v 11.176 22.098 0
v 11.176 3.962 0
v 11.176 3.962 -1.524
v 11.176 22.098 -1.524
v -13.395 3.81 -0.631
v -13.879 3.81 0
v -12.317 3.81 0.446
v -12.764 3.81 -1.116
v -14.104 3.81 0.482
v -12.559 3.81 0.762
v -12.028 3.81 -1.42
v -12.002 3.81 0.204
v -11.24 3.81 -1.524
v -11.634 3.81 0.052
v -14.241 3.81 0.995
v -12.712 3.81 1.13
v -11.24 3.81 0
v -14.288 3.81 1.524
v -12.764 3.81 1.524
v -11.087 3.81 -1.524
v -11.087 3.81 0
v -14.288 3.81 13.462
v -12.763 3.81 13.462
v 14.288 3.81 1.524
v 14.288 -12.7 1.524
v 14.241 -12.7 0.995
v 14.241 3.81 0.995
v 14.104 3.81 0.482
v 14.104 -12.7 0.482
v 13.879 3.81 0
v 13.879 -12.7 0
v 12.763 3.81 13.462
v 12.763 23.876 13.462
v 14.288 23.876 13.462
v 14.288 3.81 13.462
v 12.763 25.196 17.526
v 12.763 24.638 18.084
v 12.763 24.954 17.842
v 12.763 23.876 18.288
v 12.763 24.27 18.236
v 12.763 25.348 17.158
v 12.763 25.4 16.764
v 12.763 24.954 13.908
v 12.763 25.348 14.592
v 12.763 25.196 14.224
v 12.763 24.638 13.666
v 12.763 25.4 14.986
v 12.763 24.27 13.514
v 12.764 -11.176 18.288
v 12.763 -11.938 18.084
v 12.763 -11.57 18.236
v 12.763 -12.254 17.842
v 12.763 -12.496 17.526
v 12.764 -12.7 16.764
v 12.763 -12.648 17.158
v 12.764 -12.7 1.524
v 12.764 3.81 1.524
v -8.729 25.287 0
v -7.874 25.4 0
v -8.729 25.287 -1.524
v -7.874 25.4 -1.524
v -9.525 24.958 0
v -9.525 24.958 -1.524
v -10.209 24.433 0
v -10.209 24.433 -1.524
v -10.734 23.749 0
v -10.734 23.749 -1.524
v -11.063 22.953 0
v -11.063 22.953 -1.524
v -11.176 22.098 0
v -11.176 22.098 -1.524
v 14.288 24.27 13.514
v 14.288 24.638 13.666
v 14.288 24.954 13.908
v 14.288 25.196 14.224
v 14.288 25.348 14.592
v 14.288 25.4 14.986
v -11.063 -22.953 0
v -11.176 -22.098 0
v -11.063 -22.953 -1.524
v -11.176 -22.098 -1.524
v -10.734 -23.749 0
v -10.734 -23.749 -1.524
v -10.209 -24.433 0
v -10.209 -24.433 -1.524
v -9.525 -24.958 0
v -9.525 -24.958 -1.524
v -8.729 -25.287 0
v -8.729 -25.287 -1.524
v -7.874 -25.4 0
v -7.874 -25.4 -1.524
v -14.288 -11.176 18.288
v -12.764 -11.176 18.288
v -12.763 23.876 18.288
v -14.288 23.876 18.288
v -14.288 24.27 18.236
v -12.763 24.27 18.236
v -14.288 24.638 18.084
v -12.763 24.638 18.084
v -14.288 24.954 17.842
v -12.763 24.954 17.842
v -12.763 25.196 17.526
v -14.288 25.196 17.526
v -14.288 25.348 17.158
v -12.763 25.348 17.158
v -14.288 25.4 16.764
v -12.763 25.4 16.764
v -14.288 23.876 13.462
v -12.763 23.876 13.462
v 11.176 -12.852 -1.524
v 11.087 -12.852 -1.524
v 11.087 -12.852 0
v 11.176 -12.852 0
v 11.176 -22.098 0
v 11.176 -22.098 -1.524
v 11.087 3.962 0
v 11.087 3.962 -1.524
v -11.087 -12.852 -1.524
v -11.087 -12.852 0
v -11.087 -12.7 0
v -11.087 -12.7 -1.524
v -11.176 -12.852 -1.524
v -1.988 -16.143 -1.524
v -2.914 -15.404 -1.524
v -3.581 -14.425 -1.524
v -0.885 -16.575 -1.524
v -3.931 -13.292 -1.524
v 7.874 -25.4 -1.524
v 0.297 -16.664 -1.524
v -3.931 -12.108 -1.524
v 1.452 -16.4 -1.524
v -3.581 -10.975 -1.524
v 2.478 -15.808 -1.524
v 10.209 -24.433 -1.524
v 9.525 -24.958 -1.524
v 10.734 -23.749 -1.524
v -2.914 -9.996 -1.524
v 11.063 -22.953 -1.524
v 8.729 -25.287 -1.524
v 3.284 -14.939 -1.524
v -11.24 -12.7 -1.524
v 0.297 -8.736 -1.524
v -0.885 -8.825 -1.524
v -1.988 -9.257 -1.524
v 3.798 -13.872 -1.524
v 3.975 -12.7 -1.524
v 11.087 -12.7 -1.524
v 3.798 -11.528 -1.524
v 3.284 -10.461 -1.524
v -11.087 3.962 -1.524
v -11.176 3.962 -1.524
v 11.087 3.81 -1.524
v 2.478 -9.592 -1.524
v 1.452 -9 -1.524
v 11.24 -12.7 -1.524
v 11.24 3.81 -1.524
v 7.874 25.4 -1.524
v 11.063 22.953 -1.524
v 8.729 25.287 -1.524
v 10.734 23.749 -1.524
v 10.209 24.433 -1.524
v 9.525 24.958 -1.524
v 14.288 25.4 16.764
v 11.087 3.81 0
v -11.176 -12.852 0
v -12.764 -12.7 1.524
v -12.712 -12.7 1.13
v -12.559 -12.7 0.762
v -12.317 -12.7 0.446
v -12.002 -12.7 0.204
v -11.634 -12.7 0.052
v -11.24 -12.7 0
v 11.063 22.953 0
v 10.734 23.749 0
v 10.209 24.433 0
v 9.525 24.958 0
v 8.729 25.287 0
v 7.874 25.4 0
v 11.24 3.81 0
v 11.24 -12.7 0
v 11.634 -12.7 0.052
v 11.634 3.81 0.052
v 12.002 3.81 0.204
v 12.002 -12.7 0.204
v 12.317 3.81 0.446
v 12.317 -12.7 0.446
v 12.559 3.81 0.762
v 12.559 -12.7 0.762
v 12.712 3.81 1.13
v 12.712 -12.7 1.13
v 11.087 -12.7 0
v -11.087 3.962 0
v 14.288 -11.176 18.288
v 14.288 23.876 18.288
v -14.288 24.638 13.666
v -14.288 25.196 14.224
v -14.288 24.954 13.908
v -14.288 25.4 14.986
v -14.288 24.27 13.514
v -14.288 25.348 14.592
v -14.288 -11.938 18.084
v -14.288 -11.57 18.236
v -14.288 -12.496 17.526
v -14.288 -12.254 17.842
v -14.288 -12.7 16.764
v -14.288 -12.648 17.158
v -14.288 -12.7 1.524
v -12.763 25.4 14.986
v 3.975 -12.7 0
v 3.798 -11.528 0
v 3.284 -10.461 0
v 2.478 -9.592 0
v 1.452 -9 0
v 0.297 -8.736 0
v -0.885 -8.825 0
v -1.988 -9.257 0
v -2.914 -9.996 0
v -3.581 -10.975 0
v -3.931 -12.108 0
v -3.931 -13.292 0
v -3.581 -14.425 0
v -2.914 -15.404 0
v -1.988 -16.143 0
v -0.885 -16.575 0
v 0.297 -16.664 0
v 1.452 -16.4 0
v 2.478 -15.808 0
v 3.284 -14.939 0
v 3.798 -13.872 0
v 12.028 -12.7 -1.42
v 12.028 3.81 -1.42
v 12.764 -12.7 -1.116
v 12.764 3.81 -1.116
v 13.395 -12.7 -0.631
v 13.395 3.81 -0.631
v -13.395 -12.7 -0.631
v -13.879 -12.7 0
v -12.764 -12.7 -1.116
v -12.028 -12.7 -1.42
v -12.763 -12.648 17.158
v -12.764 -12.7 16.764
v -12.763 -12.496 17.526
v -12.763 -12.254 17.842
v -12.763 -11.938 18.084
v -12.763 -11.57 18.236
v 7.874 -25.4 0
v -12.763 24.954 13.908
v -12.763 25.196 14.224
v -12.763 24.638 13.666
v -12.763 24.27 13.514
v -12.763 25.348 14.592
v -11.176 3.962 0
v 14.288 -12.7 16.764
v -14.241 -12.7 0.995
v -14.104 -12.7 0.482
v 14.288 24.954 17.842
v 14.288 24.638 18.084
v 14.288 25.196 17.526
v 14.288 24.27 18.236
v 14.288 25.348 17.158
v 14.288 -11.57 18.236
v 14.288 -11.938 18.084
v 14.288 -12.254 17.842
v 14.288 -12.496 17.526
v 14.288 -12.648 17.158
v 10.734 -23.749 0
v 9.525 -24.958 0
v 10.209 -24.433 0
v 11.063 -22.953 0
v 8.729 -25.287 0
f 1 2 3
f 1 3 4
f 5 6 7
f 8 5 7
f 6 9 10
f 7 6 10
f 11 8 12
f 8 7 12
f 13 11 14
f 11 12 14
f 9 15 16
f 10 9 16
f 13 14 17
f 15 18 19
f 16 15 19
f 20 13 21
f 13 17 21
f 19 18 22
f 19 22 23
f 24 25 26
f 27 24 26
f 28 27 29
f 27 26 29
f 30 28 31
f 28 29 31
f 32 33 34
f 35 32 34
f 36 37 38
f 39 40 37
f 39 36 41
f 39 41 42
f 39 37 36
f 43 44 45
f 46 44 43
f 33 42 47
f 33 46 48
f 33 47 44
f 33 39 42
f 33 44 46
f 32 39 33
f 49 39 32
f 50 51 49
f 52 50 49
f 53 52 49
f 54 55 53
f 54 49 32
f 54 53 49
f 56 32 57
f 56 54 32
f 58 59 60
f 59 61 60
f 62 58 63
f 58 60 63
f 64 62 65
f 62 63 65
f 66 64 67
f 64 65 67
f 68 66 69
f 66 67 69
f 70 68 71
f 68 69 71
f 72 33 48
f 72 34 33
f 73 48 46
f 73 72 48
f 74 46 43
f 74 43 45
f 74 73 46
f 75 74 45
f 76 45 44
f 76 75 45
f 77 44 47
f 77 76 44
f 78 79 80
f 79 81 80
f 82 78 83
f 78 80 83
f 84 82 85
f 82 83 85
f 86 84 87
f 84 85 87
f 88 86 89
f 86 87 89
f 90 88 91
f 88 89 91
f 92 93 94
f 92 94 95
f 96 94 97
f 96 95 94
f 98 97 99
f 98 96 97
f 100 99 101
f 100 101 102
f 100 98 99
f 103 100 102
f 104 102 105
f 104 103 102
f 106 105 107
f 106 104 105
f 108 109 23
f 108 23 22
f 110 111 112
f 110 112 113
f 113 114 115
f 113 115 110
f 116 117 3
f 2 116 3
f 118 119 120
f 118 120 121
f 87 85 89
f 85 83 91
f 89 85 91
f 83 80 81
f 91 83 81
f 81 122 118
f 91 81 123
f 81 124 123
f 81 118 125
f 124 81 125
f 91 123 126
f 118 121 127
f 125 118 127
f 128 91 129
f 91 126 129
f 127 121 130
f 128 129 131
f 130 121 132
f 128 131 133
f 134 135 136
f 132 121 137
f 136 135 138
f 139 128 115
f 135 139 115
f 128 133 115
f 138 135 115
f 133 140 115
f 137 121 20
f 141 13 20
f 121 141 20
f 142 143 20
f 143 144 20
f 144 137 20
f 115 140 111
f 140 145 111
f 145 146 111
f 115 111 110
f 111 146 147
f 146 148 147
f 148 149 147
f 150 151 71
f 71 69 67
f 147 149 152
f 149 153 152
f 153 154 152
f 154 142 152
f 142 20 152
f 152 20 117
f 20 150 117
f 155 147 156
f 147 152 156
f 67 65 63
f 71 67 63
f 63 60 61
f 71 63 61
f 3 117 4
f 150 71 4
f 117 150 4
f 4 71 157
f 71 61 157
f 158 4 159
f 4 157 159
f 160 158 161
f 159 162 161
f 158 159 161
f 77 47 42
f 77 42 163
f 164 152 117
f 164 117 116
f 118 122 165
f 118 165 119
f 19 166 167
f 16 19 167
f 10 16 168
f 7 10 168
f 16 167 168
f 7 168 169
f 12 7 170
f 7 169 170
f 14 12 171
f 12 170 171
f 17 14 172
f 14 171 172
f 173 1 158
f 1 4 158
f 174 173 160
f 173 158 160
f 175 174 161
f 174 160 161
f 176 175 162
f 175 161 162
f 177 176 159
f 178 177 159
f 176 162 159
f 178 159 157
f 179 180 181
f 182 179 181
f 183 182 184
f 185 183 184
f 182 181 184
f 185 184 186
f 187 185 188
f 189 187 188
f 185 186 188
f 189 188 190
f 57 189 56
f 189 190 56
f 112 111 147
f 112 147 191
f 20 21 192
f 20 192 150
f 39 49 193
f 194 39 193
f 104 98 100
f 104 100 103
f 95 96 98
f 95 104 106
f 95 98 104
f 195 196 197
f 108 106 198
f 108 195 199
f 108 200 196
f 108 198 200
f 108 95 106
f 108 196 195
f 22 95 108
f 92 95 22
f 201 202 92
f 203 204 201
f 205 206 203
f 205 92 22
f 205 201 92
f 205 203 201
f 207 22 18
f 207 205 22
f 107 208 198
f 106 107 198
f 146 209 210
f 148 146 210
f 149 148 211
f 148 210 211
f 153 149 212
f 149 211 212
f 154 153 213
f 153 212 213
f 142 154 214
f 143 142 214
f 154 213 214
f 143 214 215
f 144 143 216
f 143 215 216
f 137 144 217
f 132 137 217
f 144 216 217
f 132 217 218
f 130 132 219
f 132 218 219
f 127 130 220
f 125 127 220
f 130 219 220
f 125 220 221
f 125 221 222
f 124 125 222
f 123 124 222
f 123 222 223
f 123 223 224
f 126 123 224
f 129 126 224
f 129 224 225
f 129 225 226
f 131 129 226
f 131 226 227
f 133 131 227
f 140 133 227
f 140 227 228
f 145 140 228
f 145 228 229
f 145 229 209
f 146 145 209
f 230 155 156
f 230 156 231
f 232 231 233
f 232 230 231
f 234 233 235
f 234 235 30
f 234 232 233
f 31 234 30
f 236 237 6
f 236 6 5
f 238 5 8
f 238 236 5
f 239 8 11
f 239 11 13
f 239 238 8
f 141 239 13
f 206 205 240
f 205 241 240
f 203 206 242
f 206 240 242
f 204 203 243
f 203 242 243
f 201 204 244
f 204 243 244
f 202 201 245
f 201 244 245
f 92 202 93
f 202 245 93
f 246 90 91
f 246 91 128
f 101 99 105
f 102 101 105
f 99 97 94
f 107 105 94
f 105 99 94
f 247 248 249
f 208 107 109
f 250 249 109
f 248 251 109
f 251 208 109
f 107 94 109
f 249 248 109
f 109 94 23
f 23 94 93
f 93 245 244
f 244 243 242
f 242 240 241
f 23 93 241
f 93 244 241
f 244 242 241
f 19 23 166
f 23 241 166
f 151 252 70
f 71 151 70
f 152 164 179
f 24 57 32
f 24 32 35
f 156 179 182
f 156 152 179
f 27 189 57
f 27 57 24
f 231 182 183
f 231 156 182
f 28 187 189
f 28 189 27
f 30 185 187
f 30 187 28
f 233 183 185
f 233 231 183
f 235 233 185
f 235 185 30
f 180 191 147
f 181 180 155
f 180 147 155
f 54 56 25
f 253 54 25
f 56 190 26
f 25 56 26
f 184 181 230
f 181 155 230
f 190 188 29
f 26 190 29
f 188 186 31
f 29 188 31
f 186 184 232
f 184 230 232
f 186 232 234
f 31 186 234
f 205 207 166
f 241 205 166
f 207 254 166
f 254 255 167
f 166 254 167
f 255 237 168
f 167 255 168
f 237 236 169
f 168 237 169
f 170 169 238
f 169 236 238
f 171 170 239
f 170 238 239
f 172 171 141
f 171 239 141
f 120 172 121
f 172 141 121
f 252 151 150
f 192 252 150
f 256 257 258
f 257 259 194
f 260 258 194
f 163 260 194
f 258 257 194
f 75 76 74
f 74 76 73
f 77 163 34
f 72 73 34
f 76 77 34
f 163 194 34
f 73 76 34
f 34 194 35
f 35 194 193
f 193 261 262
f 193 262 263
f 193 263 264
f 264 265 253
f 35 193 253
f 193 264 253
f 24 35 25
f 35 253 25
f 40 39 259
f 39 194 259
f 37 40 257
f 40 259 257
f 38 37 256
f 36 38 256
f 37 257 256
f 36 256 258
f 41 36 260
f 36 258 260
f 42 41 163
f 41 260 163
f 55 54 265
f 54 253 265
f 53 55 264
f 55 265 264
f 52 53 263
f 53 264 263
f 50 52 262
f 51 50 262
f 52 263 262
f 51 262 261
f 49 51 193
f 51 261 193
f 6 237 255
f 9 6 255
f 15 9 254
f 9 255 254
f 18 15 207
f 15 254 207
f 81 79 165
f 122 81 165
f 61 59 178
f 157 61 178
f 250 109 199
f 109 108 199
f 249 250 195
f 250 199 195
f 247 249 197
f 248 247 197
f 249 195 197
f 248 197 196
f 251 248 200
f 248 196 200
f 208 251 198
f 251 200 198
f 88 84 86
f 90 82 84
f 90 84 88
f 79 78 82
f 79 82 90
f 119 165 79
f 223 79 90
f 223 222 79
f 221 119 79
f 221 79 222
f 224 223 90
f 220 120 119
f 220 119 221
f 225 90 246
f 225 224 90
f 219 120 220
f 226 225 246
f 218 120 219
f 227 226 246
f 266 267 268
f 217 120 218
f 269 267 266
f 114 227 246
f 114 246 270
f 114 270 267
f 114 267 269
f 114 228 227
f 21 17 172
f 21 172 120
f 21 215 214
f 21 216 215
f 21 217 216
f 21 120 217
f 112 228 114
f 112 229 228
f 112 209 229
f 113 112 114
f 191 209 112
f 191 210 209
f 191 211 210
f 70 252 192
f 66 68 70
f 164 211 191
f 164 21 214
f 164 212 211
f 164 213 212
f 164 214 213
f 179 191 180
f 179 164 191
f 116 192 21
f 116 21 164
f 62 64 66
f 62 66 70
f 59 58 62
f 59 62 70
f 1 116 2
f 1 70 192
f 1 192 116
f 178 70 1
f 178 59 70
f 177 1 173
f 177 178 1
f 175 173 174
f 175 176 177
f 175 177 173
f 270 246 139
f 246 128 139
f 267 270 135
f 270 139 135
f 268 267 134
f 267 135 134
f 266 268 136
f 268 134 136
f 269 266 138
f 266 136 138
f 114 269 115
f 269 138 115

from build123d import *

# Parameters (mm, degrees)
CROQUIS1_W               = 28.575
CROQUIS1_H               = 50.8
BRIDA_BASE1_DEPTH        = 1.524
CROQUIS6_R               = 3.9751
CROQUIS6_W               = 3.1115
CROQUIS6_H               = 21.59
CROQUIS6_H_2             = 12.7
CORTAR_EXTRUIR1_DEPTH    = 30.182447331
BRIDA_START              = -12.7
BRIDA_DE_ARISTA1_DEPTH   = 16.51
BRIDA_START_2            = -12.8524
BRIDA_DE_ARISTA1_2_DEPTH = 0.1524
BRIDA_START_3            = 3.81
BRIDA_DE_ARISTA1_3_DEPTH = 0.1524
BRIDA_DE_ARISTA1_4_DEPTH = 16.51
CROQUIS13_W              = 1.524
CROQUIS13_H              = 4.826
SALIENTE_EXTRUIR1_DEPTH  = 21.59
REDONDEO1_R              = 3.302
REDONDEO2_R              = 1.524


# Read off the part's stored shape, not the designer's step: Brida de arista1
# Sheet-metal steps are written as plain solids
with BuildPart() as part:
    # Croquis1 → Brida base1 (new body)
    with BuildSketch(Plane.XY):
        Rectangle(CROQUIS1_W, CROQUIS1_H)
    extrude(amount=-BRIDA_BASE1_DEPTH)

    # Croquis6 → Cortar-Extruir1 (cut, through all)
    with BuildSketch(Plane.XY):
        with Locations((0, -12.7)):
            Circle(CROQUIS6_R)
        with Locations((-12.73175, 14.605)):
            Rectangle(CROQUIS6_W, CROQUIS6_H)
        with Locations((12.73175, 14.605)):
            Rectangle(CROQUIS6_W, CROQUIS6_H)
        with Locations((-12.73175, -19.05)):
            Rectangle(CROQUIS6_W, CROQUIS6_H_2)
        with Locations((12.73175, -19.05)):
            Rectangle(CROQUIS6_W, CROQUIS6_H_2)
    extrude(amount=-CORTAR_EXTRUIR1_DEPTH, mode=Mode.SUBTRACT)

    # Brida de arista1 outline → Brida de arista1 (cut)
    with BuildSketch(Plane(origin=(0, 0, 0), x_dir=(1, 0, 0), z_dir=(0, 1, 0)).offset(BRIDA_START)):
        with BuildLine():
            Line((14.2875, 1.524), (11.2395, 1.524))
            ThreePointArc((11.2395, 1.524), (12.7635, 1.115645431), (13.879145431, 0))
            Line((13.879145431, 0), (14.2875, 0))
            Line((14.2875, 0), (14.2875, 1.524))
        make_face()
        with BuildLine():
            ThreePointArc((-13.879145431, 0), (-12.7635, 1.115645431), (-11.2395, 1.524))
            Line((-11.2395, 1.524), (-14.2875, 1.524))
            Line((-14.2875, 1.524), (-14.2875, 0))
            Line((-14.2875, 0), (-13.879145431, 0))
        make_face()
    extrude(amount=BRIDA_DE_ARISTA1_DEPTH, mode=Mode.SUBTRACT)

    # Brida de arista1 2 outline → Brida de arista1 2 (cut)
    with BuildSketch(Plane(origin=(0, 0, 0), x_dir=(1, 0, 0), z_dir=(0, 1, 0)).offset(BRIDA_START_2)):
        with BuildLine():
            Line((11.0871, 1.524), (11.0871, 0))
            Line((11.0871, 0), (13.879145431, 0))
            ThreePointArc((13.879145431, 0), (12.7635, 1.115645431), (11.2395, 1.524))
            Line((11.2395, 1.524), (11.0871, 1.524))
        make_face()
        with BuildLine():
            Line((-13.879145431, 0), (-11.0871, 0))
            Line((-11.0871, 0), (-11.0871, 1.524))
            Line((-11.0871, 1.524), (-11.2395, 1.524))
            ThreePointArc((-11.2395, 1.524), (-12.7635, 1.115645431), (-13.879145431, 0))
        make_face()
    extrude(amount=BRIDA_DE_ARISTA1_2_DEPTH, mode=Mode.SUBTRACT)

    # Brida de arista1 3 outline → Brida de arista1 3 (cut)
    with BuildSketch(Plane(origin=(0, 0, 0), x_dir=(1, 0, 0), z_dir=(0, 1, 0)).offset(BRIDA_START_3)):
        with BuildLine():
            Line((11.0871, 1.524), (11.0871, 0))
            Line((11.0871, 0), (13.879145431, 0))
            ThreePointArc((13.879145431, 0), (12.7635, 1.115645431), (11.2395, 1.524))
            Line((11.2395, 1.524), (11.0871, 1.524))
        make_face()
        with BuildLine():
            Line((-13.879145431, 0), (-11.0871, 0))
            Line((-11.0871, 0), (-11.0871, 1.524))
            Line((-11.0871, 1.524), (-11.2395, 1.524))
            ThreePointArc((-11.2395, 1.524), (-12.7635, 1.115645431), (-13.879145431, 0))
        make_face()
    extrude(amount=BRIDA_DE_ARISTA1_3_DEPTH, mode=Mode.SUBTRACT)

    # Brida de arista1 4 outline → Brida de arista1 4 (add)
    with BuildSketch(Plane(origin=(0, 0, 0), x_dir=(1, 0, 0), z_dir=(0, 1, 0)).offset(BRIDA_START)):
        with BuildLine():
            Line((13.879145431, 0), (11.2395, 0))
            ThreePointArc((11.2395, 0), (12.317130735, -0.446369265), (12.7635, -1.524))
            Line((12.7635, -1.524), (12.7635, -18.288))
            Line((12.7635, -18.288), (14.2875, -18.288))
            Line((14.2875, -18.288), (14.2875, -1.524))
            ThreePointArc((14.2875, -1.524), (14.183641918, -0.735119551), (13.879145431, 0))
        make_face()
        with BuildLine():
            ThreePointArc((-12.7635, -1.524), (-12.317130735, -0.446369265), (-11.2395, 0))
            Line((-11.2395, 0), (-13.879145431, 0))
            ThreePointArc((-13.879145431, 0), (-14.183641918, -0.735119551), (-14.2875, -1.524))
            Line((-14.2875, -1.524), (-14.2875, -18.288))
            Line((-14.2875, -18.288), (-12.7635, -18.288))
            Line((-12.7635, -18.288), (-12.7635, -1.524))
        make_face()
    extrude(amount=BRIDA_DE_ARISTA1_4_DEPTH)

    # Croquis13 → Saliente-Extruir1 (add)
    with BuildSketch(Plane(origin=(0, 3.81, 0), x_dir=(1, 0, 0), z_dir=(0, 1, 0))):
        with Locations((13.5255, -15.875)):
            Rectangle(CROQUIS13_W, CROQUIS13_H)
    saliente_extruir1 = extrude(amount=SALIENTE_EXTRUIR1_DEPTH)

    # Simetría1: Saliente-Extruir1 across plane
    add(saliente_extruir1.mirror(Plane(origin=(0, 0, 0), x_dir=(0, 0, 1), z_dir=(1, 0, 0))))

    # Redondeo1
    redondeo1_edges = [part.edges().sort_by_distance(p)[0] for p in [
        (11.176, 25.4, -0.762),
        (-11.176, -25.4, -0.762),
        (11.176, -25.4, -0.762),
        (-11.176, 25.4, -0.762),
    ]]
    fillet(redondeo1_edges, radius=REDONDEO1_R)

    # Redondeo2
    redondeo2_edges = [part.edges().sort_by_distance(p)[0] for p in [
        (13.5255, -12.7, 18.288),
        (-13.5255, -12.7, 18.288),
        (13.5255, 25.4, 18.288),
        (13.5255, 25.4, 13.462),
        (-13.5255, 25.4, 13.462),
        (-13.5255, 25.4, 18.288),
    ]]
    fillet(redondeo2_edges, radius=REDONDEO2_R)


solid = part.part
